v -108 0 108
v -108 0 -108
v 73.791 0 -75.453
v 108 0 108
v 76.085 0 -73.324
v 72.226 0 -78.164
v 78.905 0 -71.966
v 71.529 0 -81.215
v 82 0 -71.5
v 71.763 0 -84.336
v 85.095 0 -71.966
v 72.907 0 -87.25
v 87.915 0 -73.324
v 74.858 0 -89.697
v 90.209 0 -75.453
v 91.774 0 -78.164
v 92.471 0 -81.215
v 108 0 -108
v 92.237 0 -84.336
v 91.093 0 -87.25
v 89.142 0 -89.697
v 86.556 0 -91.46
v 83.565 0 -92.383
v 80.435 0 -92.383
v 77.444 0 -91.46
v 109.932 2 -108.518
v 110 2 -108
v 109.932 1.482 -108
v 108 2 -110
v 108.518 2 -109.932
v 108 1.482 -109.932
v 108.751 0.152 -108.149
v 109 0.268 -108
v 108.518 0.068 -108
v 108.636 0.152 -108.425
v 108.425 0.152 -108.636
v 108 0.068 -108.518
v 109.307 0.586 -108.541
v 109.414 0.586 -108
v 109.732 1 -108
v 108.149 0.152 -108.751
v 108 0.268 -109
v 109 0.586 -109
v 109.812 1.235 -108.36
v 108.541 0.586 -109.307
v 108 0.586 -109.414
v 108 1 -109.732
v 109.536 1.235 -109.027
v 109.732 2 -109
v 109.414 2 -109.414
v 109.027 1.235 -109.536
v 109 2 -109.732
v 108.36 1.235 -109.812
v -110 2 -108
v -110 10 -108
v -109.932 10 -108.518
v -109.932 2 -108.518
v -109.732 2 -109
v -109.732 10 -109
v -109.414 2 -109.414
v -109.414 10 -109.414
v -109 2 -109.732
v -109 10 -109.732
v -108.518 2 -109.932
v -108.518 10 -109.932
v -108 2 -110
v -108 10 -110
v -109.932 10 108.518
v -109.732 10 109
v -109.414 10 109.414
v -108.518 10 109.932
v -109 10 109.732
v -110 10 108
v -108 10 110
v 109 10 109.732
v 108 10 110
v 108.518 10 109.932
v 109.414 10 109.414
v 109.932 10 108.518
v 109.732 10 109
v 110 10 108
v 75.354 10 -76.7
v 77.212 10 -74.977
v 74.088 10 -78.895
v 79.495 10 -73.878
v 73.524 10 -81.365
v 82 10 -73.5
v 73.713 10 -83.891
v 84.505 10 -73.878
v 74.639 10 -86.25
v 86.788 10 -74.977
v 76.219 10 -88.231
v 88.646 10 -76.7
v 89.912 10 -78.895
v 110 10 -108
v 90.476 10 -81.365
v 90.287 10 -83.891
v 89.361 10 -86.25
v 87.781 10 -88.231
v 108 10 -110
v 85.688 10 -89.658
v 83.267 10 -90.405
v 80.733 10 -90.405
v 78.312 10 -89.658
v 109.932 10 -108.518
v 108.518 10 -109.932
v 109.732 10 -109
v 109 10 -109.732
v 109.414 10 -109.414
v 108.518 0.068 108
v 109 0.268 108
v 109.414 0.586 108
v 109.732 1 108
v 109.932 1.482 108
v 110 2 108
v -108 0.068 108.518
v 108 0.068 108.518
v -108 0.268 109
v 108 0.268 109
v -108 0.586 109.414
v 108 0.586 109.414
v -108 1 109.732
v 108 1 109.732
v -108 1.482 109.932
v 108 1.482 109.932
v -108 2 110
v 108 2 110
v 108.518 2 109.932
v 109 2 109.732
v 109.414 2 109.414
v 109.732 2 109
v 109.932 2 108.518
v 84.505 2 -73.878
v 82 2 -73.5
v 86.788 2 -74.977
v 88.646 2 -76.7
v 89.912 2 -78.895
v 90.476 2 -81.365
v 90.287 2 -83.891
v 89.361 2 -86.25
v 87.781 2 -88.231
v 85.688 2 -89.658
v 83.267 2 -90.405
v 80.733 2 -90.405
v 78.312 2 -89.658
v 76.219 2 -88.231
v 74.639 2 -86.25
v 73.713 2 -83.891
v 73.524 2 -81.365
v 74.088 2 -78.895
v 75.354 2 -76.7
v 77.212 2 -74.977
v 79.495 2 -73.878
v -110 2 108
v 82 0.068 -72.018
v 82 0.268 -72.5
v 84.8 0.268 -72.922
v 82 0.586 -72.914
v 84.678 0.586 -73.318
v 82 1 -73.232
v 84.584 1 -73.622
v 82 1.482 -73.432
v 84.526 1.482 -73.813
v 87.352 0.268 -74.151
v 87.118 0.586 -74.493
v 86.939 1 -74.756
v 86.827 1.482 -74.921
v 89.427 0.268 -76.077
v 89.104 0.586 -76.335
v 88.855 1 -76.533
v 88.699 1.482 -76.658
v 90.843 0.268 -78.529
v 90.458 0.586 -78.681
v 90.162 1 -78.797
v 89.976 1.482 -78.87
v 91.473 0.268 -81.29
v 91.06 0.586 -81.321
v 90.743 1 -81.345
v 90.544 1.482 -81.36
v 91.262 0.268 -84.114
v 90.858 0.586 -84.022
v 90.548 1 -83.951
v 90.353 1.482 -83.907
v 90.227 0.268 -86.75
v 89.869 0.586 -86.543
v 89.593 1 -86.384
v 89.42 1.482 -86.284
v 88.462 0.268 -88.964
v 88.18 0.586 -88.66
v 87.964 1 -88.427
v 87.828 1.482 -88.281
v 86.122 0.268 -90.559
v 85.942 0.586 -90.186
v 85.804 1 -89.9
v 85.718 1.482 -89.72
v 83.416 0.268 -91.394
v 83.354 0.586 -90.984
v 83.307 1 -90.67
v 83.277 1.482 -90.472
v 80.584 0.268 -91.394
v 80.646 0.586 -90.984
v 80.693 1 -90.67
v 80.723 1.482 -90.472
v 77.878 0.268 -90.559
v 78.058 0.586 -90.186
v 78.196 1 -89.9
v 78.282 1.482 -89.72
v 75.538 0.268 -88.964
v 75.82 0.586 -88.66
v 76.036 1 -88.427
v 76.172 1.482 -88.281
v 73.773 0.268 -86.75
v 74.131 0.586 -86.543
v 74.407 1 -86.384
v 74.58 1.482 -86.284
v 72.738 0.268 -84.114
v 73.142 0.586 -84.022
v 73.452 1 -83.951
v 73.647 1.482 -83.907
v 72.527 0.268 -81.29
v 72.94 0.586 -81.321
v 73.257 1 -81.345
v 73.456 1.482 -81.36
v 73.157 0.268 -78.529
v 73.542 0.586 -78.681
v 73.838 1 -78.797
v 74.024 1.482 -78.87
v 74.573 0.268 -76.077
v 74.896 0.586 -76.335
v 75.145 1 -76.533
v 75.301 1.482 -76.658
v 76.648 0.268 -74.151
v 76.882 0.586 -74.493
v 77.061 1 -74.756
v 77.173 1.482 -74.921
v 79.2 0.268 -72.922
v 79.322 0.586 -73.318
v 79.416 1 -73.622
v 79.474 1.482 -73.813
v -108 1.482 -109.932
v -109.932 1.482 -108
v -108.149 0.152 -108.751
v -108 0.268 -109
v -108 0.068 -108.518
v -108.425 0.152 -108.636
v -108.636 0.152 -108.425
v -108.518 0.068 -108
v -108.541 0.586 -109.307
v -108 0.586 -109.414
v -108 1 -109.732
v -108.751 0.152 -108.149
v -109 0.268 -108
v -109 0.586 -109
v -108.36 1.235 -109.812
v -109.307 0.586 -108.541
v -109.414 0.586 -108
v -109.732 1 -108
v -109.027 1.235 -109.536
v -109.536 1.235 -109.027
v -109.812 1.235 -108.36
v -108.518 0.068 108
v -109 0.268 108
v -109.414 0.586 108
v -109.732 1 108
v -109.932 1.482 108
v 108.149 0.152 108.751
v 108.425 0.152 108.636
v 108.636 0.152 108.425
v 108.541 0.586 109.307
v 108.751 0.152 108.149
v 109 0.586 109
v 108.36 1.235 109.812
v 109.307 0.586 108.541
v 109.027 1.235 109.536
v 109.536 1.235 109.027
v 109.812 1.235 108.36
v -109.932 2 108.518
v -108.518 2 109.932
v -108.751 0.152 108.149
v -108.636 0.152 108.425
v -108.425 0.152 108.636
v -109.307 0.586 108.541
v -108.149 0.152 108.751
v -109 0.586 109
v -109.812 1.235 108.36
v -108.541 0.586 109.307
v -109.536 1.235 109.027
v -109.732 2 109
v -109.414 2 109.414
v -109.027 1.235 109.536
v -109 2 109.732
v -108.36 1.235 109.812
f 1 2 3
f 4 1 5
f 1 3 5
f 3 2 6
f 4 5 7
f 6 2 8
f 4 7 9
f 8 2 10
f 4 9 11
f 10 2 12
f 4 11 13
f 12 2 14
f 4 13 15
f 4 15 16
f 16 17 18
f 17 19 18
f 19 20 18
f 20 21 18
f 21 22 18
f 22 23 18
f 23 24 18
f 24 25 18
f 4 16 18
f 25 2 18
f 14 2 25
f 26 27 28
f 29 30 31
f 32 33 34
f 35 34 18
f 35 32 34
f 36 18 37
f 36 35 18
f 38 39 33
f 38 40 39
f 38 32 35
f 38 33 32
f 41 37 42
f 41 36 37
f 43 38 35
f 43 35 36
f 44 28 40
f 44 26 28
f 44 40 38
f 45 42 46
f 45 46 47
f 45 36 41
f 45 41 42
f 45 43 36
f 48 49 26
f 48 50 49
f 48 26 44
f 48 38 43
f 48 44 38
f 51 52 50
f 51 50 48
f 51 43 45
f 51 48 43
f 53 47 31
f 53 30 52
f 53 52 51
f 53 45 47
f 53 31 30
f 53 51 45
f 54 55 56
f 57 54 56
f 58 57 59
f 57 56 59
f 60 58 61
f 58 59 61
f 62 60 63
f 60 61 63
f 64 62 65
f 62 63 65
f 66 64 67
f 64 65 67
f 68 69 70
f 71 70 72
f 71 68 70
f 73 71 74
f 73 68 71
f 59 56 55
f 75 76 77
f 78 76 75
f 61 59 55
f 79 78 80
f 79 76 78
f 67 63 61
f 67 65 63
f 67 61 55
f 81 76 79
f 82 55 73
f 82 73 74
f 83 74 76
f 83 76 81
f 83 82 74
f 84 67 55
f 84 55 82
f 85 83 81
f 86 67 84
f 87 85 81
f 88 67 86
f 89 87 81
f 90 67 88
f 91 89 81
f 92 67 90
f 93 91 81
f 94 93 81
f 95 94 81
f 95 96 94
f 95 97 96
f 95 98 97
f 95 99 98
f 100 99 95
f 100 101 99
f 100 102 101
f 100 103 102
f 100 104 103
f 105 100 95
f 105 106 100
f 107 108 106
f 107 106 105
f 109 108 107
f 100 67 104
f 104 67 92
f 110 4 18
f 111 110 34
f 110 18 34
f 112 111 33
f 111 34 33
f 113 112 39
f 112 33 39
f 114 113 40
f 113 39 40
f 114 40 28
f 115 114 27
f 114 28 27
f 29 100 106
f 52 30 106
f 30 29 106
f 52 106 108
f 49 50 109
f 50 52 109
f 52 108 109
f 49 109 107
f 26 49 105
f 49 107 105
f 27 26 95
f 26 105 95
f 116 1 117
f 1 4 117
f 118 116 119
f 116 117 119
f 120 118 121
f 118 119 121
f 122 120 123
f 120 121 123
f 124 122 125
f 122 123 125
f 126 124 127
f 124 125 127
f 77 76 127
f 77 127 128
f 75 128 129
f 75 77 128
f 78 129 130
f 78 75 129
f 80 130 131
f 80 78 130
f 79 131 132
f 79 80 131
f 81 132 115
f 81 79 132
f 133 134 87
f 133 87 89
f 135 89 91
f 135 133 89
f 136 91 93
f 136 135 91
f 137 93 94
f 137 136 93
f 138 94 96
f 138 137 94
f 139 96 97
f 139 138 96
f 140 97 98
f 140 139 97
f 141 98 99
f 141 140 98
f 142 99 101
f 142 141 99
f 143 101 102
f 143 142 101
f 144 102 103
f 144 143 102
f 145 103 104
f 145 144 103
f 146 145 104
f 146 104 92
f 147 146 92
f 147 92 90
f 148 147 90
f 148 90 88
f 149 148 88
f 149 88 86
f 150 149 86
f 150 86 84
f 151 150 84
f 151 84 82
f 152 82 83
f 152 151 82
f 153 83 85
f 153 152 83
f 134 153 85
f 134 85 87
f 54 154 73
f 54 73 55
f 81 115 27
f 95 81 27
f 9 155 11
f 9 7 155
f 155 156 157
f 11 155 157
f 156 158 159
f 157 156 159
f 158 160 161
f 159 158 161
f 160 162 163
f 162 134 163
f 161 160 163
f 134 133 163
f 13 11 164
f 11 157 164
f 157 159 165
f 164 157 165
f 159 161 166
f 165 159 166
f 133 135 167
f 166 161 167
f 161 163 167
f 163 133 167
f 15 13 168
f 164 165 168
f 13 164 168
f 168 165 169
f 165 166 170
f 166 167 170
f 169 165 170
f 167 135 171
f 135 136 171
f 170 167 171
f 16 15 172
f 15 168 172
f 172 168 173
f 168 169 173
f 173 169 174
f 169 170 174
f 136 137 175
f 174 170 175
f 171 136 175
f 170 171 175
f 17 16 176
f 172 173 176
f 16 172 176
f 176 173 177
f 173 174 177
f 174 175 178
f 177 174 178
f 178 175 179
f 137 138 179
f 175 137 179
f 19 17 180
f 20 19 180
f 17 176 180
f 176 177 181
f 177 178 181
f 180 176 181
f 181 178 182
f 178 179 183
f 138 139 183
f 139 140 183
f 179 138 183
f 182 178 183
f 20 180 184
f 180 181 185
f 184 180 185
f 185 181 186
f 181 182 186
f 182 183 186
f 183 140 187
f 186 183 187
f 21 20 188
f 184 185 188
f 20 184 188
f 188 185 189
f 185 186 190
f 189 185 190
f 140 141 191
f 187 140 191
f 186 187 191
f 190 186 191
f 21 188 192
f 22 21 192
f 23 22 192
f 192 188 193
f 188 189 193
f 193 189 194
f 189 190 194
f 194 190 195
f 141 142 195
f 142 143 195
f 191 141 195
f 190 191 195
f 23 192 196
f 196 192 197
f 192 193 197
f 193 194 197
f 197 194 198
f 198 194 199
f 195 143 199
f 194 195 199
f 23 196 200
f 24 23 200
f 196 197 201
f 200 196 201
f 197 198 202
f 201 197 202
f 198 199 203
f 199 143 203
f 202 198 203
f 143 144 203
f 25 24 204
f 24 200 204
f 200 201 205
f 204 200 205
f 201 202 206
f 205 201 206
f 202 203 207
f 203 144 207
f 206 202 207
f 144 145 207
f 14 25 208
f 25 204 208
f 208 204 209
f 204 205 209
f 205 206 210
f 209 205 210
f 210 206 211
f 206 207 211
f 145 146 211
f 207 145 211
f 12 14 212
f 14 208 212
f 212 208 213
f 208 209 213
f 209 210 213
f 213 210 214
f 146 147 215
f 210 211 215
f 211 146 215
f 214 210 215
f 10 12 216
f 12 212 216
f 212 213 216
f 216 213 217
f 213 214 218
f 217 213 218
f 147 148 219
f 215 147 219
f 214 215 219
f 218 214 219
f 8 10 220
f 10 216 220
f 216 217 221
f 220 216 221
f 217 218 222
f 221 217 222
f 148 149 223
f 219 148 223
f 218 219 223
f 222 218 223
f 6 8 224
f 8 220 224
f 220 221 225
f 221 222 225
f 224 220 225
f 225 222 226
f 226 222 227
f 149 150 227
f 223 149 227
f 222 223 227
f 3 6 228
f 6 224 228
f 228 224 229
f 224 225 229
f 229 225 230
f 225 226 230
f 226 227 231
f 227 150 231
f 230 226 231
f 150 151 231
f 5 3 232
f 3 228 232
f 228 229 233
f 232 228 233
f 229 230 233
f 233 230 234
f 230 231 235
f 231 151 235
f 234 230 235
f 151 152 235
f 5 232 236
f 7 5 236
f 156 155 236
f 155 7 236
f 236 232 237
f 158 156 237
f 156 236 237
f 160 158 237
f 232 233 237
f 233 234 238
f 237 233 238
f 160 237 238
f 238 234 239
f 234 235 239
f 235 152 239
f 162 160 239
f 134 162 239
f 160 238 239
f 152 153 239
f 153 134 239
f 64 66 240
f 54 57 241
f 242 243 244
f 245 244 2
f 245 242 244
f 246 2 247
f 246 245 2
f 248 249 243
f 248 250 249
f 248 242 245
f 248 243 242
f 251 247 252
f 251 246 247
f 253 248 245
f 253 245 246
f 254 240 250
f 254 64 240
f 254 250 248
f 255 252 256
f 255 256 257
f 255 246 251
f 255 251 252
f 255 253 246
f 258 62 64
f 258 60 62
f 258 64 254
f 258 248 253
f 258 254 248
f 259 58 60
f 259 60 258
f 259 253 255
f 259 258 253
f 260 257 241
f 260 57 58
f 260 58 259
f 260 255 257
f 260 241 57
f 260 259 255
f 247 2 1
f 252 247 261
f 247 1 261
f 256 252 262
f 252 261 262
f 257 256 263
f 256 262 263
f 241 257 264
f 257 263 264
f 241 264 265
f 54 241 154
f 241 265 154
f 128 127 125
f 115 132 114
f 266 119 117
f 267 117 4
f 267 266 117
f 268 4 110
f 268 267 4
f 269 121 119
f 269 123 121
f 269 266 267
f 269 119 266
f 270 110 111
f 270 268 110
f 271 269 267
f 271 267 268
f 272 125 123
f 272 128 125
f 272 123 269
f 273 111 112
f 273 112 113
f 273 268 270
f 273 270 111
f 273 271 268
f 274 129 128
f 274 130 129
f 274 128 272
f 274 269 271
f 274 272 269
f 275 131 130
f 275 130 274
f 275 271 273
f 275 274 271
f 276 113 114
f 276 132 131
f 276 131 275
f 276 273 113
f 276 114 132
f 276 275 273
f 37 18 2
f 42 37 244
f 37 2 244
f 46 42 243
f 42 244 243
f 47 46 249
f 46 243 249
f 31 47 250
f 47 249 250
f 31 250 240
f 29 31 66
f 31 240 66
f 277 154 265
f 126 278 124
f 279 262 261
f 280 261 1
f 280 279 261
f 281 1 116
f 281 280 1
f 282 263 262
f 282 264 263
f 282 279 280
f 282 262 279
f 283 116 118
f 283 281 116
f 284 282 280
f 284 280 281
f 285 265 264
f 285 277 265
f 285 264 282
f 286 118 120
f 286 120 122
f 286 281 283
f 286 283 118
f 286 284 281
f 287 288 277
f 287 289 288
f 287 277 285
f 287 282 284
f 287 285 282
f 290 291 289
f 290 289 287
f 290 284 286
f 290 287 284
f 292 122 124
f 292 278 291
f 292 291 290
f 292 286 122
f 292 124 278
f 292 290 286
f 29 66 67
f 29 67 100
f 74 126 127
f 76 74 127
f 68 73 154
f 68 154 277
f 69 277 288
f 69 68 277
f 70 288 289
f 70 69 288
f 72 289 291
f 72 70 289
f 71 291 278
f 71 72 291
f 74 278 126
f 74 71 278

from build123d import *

# Parameters (mm, degrees)
SKETCH1_W           = 220
SKETCH1_H           = 220
SKETCH1_W_2         = 194
SKETCH1_H_2         = 194
SKETCH1_R           = 8.5
BOSS_EXTRUDE1_DEPTH = 10
FILLET1_R           = 2
FILLET2_R           = 2


with BuildPart() as part:
    # Sketch1 → Boss-Extrude1 (new body)
    # profile 1 of 2: a face of its own
    with BuildSketch(Plane(origin=(0, 0, 0), x_dir=(1, 0, 0), z_dir=(0, 1, 0))):
        Rectangle(SKETCH1_W, SKETCH1_H)
        Rectangle(SKETCH1_W_2, SKETCH1_H_2, mode=Mode.SUBTRACT)
    # profile 2 of 2: a face of its own
    with BuildSketch(Plane(origin=(0, 0, 0), x_dir=(1, 0, 0), z_dir=(0, 1, 0))):
        Rectangle(SKETCH1_W_2, SKETCH1_H_2)
        with Locations(Location((82, 82, 0), (0, 0, 270))):
            Circle(SKETCH1_R, mode=Mode.SUBTRACT)
    extrude(amount=BOSS_EXTRUDE1_DEPTH)

    # Fillet1
    fillet1_edges = [part.edges().sort_by_distance(p)[0] for p in [
        (110, 5, 110),
        (-110, 5, 110),
        (-110, 5, -110),
        (110, 5, -110),
    ]]
    fillet(fillet1_edges, radius=FILLET1_R)

    # Fillet2
    fillet2_edges = [part.edges().sort_by_distance(p)[0] for p in [
        (0, 0, 110),
        (110, 0, 0),
        (-110, 0, 0),
        (0, 0, -110),
        (109.414213562, 0, 109.414213562),
        (109.414213562, 0, -109.414213562),
        (-109.414213562, 0, -109.414213562),
        (-109.414213562, 0, 109.414213562),
        (82, 0, -90.5),
    ]]
    fillet(fillet2_edges, radius=FILLET2_R)


solid = part.part
